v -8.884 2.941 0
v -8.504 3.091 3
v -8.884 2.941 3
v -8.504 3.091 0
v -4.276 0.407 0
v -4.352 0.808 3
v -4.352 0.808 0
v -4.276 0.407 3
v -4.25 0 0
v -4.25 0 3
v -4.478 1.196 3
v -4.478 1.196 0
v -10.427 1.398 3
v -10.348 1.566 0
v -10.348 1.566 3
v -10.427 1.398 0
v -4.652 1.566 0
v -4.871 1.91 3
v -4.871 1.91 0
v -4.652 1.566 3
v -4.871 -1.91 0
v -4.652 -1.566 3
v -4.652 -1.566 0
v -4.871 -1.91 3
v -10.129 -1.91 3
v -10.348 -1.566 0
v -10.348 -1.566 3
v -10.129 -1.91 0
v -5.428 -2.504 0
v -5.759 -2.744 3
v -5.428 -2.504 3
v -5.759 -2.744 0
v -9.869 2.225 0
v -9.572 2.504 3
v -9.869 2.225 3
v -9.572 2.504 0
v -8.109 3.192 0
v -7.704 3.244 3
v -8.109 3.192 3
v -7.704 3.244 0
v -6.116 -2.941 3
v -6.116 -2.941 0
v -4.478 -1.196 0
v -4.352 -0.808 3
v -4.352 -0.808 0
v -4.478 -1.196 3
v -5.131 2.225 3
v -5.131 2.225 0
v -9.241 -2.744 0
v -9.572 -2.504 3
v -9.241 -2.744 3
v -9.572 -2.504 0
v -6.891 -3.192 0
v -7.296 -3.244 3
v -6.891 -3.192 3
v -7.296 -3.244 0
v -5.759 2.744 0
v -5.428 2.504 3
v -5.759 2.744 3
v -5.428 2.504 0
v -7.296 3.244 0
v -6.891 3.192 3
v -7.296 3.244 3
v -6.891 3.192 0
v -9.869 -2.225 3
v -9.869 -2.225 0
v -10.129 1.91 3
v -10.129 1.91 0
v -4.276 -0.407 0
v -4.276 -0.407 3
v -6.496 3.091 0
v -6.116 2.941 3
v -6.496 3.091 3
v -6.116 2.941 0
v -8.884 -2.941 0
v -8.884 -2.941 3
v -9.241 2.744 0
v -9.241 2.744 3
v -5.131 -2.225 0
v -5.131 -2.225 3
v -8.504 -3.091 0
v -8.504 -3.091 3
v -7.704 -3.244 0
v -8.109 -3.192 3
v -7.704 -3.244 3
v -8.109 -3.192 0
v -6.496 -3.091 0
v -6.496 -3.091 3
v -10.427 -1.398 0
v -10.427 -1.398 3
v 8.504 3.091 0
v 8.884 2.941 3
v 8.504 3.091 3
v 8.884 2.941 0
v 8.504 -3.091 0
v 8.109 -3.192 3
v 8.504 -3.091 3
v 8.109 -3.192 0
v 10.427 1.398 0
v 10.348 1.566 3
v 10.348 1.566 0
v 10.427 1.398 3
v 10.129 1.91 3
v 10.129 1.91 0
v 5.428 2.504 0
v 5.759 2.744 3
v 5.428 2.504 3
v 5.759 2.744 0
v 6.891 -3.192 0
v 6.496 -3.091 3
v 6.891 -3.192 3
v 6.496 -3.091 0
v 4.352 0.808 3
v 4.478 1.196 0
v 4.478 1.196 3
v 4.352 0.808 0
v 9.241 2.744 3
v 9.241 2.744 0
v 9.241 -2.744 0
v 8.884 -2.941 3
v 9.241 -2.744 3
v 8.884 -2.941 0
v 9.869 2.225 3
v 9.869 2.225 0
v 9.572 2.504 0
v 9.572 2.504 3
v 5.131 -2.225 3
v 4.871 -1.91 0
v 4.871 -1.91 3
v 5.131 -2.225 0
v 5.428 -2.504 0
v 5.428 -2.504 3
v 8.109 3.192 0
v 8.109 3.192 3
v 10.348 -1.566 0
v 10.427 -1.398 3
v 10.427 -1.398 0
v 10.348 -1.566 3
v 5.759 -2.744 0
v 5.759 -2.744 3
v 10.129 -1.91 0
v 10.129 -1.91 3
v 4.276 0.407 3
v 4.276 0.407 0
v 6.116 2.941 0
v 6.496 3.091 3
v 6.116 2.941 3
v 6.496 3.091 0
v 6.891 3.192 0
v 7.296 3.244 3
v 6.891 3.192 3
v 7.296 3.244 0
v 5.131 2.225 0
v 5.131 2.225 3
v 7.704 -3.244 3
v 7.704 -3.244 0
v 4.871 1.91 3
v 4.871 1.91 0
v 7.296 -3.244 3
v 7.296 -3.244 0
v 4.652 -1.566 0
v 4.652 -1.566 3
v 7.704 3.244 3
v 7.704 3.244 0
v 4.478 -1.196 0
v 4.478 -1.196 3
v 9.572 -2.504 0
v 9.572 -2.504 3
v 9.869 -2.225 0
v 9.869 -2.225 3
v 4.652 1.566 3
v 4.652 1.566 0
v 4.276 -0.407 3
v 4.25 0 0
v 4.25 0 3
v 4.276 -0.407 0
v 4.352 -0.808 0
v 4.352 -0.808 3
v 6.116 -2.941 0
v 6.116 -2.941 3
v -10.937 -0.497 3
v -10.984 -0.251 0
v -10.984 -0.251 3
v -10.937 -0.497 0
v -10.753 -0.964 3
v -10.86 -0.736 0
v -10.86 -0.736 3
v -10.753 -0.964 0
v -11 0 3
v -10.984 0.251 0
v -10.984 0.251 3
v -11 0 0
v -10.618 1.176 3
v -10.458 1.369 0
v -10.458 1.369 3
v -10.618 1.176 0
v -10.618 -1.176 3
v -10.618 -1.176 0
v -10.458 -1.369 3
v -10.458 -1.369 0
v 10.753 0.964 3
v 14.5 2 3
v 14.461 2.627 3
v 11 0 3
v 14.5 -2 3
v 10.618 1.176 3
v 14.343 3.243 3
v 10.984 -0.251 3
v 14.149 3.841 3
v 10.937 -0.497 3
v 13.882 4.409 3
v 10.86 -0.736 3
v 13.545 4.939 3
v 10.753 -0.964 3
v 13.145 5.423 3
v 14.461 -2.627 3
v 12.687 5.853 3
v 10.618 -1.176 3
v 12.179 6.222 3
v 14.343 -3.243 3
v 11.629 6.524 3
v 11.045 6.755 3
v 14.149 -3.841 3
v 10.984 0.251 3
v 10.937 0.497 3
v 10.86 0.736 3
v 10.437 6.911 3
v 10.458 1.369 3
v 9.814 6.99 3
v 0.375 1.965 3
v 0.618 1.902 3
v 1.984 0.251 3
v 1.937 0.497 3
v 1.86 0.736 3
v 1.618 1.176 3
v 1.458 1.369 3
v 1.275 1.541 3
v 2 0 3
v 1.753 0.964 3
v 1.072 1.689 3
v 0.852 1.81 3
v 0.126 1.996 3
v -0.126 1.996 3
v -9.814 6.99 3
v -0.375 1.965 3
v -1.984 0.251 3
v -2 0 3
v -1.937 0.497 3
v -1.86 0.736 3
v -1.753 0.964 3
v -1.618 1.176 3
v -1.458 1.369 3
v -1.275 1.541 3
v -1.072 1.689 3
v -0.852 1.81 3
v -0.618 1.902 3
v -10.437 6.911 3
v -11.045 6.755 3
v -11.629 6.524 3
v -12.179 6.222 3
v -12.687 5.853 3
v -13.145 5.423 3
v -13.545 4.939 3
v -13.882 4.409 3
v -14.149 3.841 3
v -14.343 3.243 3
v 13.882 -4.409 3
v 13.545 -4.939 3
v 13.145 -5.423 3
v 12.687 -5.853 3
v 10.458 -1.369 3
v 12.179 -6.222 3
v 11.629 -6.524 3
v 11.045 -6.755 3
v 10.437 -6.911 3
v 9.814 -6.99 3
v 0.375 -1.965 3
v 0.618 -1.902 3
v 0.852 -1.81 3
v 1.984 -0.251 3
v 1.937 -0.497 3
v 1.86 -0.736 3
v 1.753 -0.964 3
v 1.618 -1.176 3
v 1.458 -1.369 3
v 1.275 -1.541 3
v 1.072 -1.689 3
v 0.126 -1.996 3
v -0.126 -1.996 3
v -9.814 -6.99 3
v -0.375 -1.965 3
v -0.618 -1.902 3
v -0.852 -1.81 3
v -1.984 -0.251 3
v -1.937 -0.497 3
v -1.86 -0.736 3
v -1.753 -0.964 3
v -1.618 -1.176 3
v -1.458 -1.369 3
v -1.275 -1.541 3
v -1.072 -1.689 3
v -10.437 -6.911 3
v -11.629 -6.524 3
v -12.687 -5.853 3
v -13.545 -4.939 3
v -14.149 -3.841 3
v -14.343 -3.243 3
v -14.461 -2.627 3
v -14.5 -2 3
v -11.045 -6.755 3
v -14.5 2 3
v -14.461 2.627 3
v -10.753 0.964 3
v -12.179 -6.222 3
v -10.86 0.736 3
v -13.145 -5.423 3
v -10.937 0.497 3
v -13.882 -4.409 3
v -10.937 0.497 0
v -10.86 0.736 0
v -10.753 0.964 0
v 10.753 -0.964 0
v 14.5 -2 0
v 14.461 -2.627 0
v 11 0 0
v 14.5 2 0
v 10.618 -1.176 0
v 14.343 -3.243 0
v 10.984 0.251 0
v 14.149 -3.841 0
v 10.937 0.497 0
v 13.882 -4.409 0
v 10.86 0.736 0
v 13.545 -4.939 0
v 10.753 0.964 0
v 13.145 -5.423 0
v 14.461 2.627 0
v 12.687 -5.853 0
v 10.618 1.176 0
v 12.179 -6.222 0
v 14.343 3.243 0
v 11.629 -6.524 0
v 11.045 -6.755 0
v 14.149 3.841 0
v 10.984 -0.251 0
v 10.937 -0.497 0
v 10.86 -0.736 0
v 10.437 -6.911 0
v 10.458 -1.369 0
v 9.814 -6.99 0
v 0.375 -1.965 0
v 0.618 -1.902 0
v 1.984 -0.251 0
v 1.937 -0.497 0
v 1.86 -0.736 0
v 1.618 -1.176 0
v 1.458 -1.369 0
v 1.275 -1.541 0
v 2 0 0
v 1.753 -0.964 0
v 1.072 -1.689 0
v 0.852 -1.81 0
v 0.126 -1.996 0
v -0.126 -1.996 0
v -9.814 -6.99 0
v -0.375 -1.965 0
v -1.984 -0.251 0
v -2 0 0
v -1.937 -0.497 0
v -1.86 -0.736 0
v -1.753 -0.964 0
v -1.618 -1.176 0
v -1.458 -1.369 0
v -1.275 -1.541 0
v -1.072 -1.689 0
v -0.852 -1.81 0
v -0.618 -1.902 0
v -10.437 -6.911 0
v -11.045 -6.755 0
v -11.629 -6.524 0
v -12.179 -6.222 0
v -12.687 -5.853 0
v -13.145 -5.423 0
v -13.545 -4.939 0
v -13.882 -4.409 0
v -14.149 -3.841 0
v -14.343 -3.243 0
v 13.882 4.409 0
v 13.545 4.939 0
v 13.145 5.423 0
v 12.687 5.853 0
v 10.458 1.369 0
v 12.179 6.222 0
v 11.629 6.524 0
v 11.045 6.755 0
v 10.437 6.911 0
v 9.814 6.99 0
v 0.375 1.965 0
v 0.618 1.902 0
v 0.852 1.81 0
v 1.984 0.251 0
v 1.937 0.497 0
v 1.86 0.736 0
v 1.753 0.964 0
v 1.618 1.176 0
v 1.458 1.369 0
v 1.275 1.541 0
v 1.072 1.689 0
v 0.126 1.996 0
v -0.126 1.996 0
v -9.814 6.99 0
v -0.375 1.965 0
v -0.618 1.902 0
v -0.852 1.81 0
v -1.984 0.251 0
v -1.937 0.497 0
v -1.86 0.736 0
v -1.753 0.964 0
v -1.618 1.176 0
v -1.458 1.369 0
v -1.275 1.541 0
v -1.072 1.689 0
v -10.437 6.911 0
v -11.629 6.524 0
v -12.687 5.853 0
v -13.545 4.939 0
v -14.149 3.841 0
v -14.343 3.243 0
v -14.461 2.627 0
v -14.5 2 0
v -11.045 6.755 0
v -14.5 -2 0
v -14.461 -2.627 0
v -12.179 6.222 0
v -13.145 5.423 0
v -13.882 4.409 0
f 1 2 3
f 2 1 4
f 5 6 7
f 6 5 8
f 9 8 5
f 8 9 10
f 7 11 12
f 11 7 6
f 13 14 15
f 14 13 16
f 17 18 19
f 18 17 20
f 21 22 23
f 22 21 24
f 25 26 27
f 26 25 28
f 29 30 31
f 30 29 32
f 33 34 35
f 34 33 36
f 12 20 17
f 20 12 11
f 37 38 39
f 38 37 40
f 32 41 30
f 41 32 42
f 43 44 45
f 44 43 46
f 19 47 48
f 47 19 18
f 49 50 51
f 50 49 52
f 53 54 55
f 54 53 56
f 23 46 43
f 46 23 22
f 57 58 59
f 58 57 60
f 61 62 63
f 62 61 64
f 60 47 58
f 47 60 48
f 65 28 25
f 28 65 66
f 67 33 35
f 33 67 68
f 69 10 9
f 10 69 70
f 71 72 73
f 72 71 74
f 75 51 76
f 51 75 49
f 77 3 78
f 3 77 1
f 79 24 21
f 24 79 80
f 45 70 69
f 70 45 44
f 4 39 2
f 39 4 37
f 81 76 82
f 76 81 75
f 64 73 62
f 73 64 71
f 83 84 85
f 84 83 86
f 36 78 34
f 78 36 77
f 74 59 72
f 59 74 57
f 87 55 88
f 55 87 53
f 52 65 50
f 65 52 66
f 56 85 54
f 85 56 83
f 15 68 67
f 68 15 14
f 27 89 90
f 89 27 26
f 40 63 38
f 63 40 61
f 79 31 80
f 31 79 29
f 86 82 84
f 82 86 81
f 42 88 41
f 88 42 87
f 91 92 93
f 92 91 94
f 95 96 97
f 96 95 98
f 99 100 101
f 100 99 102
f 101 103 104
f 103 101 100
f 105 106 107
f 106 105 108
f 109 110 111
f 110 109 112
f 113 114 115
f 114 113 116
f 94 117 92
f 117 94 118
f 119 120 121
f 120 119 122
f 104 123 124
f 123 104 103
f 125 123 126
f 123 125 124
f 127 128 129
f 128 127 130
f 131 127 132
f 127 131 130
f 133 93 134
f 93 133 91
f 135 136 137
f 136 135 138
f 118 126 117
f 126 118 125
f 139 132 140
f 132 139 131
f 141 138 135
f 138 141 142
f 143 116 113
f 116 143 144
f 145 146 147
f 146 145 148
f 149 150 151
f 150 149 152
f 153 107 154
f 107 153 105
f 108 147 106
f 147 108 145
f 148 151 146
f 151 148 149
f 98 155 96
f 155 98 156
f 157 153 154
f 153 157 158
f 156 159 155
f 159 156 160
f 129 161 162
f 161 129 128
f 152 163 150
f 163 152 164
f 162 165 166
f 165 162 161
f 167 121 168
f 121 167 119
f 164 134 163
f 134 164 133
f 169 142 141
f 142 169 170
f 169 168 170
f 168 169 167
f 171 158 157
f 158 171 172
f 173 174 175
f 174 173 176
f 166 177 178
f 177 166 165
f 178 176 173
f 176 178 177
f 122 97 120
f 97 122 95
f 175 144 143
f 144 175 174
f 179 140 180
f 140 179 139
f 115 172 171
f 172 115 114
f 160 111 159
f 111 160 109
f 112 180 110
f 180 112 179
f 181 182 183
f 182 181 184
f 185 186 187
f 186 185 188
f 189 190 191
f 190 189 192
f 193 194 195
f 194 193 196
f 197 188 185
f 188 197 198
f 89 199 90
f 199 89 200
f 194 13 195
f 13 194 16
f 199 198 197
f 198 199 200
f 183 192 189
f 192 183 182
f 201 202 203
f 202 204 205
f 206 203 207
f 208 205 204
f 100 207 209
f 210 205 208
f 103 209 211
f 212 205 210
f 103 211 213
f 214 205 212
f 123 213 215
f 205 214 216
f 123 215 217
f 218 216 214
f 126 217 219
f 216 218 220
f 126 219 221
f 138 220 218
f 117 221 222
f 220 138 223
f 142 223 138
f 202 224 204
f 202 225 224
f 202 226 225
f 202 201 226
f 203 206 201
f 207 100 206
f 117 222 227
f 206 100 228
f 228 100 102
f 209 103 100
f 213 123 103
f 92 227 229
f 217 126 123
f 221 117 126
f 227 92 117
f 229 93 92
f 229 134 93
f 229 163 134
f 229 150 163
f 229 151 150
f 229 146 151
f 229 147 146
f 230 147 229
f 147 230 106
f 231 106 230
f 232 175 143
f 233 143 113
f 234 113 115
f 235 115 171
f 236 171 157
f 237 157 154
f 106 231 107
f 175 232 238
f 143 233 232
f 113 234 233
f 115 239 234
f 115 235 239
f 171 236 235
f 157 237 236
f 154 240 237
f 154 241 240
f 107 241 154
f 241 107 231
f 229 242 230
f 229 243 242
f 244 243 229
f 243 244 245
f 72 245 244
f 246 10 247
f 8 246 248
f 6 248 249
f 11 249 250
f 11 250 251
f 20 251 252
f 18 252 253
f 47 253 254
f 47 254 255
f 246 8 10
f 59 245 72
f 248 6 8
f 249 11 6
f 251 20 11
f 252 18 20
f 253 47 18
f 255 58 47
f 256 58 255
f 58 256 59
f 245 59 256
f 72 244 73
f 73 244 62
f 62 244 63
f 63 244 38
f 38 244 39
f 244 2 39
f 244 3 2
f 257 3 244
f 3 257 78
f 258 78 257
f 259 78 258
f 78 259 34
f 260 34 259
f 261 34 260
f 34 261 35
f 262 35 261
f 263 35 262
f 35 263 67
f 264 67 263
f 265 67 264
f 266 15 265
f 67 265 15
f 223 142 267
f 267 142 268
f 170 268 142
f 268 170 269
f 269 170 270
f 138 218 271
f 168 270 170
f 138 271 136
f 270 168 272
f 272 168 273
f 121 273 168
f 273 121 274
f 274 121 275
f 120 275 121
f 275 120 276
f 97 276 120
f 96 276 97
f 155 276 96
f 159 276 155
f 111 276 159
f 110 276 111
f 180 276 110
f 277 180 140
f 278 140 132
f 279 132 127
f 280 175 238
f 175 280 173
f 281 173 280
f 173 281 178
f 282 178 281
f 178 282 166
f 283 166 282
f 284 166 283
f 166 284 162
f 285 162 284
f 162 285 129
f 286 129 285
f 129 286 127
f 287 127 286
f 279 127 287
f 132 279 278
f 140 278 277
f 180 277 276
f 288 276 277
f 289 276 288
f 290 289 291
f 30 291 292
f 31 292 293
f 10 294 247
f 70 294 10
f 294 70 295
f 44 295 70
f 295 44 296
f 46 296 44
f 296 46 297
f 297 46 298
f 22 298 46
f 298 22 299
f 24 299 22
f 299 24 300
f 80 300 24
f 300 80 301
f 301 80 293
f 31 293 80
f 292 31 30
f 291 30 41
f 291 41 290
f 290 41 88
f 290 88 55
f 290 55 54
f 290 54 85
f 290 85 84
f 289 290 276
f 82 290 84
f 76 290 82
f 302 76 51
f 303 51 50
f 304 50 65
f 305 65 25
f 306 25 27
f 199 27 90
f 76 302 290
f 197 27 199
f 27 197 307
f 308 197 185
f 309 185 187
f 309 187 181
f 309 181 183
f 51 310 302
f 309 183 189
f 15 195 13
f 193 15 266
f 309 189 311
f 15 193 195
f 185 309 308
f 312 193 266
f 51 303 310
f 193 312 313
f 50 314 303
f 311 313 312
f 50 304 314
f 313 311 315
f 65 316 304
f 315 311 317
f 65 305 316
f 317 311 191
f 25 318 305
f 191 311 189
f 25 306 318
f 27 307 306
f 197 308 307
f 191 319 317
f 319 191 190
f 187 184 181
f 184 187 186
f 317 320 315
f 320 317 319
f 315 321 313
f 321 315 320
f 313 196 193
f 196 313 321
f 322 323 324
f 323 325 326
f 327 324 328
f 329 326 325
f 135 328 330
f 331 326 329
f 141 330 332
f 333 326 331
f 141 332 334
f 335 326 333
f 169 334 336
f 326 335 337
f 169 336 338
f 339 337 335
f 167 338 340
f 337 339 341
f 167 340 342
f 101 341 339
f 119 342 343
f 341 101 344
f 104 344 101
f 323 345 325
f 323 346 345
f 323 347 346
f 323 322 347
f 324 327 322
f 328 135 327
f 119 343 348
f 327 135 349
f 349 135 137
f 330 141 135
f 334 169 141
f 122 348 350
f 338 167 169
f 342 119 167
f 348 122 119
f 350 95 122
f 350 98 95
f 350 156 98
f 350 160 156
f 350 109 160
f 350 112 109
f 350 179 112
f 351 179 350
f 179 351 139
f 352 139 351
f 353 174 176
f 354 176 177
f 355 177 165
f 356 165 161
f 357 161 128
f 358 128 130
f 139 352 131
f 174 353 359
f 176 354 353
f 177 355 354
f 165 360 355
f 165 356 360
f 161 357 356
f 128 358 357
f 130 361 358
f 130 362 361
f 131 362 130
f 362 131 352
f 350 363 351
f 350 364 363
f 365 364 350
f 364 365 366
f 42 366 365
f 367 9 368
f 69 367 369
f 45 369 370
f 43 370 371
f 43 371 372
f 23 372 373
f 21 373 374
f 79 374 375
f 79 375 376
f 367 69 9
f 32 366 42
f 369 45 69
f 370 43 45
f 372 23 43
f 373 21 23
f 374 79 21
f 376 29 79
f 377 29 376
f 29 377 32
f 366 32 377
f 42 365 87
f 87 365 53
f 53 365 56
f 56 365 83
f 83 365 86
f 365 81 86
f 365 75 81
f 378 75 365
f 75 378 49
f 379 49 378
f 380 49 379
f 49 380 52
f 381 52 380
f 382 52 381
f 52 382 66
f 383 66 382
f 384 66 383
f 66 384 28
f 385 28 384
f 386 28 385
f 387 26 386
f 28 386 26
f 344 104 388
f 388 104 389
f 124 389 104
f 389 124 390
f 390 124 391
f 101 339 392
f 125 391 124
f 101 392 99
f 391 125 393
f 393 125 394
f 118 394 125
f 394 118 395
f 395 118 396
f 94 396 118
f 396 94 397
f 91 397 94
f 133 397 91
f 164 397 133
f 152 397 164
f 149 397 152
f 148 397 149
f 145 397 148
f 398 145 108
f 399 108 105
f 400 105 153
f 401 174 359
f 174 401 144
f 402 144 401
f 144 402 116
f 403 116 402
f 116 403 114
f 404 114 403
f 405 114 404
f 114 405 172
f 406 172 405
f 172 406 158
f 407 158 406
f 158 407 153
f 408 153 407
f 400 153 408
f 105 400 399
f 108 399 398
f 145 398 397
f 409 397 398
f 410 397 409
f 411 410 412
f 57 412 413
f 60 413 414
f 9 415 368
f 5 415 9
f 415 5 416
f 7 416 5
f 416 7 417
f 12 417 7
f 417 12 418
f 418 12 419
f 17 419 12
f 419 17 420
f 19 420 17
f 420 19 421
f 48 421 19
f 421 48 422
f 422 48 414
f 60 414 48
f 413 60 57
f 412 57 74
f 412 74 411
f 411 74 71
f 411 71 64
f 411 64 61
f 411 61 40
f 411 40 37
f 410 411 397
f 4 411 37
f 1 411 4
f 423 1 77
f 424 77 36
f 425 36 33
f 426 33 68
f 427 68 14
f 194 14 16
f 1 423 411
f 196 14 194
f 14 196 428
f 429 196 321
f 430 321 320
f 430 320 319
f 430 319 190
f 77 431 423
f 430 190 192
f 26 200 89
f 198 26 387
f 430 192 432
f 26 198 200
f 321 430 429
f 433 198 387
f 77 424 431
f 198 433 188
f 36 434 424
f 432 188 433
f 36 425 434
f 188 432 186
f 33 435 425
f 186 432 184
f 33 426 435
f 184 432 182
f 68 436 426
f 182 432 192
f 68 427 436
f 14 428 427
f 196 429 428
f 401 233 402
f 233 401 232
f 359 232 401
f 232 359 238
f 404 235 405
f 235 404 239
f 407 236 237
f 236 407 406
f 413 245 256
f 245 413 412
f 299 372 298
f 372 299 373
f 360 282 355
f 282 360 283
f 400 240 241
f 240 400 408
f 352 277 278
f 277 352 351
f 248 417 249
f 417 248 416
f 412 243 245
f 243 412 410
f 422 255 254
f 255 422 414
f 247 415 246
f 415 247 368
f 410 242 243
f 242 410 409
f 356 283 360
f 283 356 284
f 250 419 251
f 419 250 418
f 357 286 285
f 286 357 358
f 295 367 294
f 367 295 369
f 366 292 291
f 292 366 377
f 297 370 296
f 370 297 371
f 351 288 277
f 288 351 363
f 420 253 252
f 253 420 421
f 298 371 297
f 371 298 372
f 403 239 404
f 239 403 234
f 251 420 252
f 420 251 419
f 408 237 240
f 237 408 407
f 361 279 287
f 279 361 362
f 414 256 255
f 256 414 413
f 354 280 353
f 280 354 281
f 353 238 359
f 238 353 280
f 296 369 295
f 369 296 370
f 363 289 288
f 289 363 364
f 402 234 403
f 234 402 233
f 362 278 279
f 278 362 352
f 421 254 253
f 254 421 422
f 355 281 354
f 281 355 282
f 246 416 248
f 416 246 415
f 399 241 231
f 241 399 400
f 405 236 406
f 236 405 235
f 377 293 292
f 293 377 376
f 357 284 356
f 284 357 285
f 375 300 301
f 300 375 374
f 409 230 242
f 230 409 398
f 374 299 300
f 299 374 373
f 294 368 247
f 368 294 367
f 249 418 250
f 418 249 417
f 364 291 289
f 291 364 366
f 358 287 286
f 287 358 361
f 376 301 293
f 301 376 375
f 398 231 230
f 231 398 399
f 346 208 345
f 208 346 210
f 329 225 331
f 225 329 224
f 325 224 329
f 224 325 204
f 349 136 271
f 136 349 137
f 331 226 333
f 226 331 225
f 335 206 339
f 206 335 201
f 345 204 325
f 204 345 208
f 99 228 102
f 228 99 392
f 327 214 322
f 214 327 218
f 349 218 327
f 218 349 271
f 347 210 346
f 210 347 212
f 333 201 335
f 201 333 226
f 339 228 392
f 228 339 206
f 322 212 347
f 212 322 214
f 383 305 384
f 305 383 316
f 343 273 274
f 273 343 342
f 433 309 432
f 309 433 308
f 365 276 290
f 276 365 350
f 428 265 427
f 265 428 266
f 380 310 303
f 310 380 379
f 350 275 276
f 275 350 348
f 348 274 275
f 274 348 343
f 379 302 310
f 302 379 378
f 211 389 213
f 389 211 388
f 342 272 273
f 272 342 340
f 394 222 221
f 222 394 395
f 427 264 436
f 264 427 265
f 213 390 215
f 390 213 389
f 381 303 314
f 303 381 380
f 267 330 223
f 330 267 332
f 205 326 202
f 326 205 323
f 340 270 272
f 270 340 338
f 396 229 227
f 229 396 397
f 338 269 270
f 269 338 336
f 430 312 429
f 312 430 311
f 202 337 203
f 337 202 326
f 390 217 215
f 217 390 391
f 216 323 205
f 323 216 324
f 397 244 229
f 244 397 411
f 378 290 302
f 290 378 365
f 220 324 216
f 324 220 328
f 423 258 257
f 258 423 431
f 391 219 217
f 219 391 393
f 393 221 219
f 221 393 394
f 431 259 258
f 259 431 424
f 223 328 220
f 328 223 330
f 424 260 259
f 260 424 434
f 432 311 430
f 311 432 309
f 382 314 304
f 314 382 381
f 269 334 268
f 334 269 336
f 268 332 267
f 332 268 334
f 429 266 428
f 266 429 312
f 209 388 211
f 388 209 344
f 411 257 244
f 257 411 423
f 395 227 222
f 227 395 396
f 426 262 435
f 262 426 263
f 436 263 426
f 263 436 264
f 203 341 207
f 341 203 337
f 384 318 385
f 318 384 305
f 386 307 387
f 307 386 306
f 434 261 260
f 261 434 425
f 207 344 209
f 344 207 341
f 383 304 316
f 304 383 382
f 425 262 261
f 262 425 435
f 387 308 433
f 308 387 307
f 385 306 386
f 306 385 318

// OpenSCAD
$fn = 50;


difference() {
	union() {
		hull() {
			translate(v = [-9.5000000000, 2.0000000000, 0]) {
				cylinder(h = 3, r = 5);
			}
			translate(v = [9.5000000000, 2.0000000000, 0]) {
				cylinder(h = 3, r = 5);
			}
			translate(v = [-9.5000000000, -2.0000000000, 0]) {
				cylinder(h = 3, r = 5);
			}
			translate(v = [9.5000000000, -2.0000000000, 0]) {
				cylinder(h = 3, r = 5);
			}
		}
	}
	union() {
		#translate(v = [-7.5000000000, 0.0000000000, -100.0000000000]) {
			cylinder(h = 200, r = 3.2500000000);
		}
		#translate(v = [-7.5000000000, 0.0000000000, -100.0000000000]) {
			cylinder(h = 200, r = 3.2500000000);
		}
		#translate(v = [7.5000000000, 0.0000000000, -100.0000000000]) {
			cylinder(h = 200, r = 3.2500000000);
		}
		#translate(v = [7.5000000000, 0.0000000000, -100.0000000000]) {
			cylinder(h = 200, r = 3.2500000000);
		}
		#translate(v = [-9.0000000000, 0, 0]) {
			cylinder(h = 3, r = 2.0000000000);
		}
		#cylinder(h = 3, r = 2.0000000000);
		#translate(v = [9.0000000000, 0, 0]) {
			cylinder(h = 3, r = 2.0000000000);
		}
	}
}
